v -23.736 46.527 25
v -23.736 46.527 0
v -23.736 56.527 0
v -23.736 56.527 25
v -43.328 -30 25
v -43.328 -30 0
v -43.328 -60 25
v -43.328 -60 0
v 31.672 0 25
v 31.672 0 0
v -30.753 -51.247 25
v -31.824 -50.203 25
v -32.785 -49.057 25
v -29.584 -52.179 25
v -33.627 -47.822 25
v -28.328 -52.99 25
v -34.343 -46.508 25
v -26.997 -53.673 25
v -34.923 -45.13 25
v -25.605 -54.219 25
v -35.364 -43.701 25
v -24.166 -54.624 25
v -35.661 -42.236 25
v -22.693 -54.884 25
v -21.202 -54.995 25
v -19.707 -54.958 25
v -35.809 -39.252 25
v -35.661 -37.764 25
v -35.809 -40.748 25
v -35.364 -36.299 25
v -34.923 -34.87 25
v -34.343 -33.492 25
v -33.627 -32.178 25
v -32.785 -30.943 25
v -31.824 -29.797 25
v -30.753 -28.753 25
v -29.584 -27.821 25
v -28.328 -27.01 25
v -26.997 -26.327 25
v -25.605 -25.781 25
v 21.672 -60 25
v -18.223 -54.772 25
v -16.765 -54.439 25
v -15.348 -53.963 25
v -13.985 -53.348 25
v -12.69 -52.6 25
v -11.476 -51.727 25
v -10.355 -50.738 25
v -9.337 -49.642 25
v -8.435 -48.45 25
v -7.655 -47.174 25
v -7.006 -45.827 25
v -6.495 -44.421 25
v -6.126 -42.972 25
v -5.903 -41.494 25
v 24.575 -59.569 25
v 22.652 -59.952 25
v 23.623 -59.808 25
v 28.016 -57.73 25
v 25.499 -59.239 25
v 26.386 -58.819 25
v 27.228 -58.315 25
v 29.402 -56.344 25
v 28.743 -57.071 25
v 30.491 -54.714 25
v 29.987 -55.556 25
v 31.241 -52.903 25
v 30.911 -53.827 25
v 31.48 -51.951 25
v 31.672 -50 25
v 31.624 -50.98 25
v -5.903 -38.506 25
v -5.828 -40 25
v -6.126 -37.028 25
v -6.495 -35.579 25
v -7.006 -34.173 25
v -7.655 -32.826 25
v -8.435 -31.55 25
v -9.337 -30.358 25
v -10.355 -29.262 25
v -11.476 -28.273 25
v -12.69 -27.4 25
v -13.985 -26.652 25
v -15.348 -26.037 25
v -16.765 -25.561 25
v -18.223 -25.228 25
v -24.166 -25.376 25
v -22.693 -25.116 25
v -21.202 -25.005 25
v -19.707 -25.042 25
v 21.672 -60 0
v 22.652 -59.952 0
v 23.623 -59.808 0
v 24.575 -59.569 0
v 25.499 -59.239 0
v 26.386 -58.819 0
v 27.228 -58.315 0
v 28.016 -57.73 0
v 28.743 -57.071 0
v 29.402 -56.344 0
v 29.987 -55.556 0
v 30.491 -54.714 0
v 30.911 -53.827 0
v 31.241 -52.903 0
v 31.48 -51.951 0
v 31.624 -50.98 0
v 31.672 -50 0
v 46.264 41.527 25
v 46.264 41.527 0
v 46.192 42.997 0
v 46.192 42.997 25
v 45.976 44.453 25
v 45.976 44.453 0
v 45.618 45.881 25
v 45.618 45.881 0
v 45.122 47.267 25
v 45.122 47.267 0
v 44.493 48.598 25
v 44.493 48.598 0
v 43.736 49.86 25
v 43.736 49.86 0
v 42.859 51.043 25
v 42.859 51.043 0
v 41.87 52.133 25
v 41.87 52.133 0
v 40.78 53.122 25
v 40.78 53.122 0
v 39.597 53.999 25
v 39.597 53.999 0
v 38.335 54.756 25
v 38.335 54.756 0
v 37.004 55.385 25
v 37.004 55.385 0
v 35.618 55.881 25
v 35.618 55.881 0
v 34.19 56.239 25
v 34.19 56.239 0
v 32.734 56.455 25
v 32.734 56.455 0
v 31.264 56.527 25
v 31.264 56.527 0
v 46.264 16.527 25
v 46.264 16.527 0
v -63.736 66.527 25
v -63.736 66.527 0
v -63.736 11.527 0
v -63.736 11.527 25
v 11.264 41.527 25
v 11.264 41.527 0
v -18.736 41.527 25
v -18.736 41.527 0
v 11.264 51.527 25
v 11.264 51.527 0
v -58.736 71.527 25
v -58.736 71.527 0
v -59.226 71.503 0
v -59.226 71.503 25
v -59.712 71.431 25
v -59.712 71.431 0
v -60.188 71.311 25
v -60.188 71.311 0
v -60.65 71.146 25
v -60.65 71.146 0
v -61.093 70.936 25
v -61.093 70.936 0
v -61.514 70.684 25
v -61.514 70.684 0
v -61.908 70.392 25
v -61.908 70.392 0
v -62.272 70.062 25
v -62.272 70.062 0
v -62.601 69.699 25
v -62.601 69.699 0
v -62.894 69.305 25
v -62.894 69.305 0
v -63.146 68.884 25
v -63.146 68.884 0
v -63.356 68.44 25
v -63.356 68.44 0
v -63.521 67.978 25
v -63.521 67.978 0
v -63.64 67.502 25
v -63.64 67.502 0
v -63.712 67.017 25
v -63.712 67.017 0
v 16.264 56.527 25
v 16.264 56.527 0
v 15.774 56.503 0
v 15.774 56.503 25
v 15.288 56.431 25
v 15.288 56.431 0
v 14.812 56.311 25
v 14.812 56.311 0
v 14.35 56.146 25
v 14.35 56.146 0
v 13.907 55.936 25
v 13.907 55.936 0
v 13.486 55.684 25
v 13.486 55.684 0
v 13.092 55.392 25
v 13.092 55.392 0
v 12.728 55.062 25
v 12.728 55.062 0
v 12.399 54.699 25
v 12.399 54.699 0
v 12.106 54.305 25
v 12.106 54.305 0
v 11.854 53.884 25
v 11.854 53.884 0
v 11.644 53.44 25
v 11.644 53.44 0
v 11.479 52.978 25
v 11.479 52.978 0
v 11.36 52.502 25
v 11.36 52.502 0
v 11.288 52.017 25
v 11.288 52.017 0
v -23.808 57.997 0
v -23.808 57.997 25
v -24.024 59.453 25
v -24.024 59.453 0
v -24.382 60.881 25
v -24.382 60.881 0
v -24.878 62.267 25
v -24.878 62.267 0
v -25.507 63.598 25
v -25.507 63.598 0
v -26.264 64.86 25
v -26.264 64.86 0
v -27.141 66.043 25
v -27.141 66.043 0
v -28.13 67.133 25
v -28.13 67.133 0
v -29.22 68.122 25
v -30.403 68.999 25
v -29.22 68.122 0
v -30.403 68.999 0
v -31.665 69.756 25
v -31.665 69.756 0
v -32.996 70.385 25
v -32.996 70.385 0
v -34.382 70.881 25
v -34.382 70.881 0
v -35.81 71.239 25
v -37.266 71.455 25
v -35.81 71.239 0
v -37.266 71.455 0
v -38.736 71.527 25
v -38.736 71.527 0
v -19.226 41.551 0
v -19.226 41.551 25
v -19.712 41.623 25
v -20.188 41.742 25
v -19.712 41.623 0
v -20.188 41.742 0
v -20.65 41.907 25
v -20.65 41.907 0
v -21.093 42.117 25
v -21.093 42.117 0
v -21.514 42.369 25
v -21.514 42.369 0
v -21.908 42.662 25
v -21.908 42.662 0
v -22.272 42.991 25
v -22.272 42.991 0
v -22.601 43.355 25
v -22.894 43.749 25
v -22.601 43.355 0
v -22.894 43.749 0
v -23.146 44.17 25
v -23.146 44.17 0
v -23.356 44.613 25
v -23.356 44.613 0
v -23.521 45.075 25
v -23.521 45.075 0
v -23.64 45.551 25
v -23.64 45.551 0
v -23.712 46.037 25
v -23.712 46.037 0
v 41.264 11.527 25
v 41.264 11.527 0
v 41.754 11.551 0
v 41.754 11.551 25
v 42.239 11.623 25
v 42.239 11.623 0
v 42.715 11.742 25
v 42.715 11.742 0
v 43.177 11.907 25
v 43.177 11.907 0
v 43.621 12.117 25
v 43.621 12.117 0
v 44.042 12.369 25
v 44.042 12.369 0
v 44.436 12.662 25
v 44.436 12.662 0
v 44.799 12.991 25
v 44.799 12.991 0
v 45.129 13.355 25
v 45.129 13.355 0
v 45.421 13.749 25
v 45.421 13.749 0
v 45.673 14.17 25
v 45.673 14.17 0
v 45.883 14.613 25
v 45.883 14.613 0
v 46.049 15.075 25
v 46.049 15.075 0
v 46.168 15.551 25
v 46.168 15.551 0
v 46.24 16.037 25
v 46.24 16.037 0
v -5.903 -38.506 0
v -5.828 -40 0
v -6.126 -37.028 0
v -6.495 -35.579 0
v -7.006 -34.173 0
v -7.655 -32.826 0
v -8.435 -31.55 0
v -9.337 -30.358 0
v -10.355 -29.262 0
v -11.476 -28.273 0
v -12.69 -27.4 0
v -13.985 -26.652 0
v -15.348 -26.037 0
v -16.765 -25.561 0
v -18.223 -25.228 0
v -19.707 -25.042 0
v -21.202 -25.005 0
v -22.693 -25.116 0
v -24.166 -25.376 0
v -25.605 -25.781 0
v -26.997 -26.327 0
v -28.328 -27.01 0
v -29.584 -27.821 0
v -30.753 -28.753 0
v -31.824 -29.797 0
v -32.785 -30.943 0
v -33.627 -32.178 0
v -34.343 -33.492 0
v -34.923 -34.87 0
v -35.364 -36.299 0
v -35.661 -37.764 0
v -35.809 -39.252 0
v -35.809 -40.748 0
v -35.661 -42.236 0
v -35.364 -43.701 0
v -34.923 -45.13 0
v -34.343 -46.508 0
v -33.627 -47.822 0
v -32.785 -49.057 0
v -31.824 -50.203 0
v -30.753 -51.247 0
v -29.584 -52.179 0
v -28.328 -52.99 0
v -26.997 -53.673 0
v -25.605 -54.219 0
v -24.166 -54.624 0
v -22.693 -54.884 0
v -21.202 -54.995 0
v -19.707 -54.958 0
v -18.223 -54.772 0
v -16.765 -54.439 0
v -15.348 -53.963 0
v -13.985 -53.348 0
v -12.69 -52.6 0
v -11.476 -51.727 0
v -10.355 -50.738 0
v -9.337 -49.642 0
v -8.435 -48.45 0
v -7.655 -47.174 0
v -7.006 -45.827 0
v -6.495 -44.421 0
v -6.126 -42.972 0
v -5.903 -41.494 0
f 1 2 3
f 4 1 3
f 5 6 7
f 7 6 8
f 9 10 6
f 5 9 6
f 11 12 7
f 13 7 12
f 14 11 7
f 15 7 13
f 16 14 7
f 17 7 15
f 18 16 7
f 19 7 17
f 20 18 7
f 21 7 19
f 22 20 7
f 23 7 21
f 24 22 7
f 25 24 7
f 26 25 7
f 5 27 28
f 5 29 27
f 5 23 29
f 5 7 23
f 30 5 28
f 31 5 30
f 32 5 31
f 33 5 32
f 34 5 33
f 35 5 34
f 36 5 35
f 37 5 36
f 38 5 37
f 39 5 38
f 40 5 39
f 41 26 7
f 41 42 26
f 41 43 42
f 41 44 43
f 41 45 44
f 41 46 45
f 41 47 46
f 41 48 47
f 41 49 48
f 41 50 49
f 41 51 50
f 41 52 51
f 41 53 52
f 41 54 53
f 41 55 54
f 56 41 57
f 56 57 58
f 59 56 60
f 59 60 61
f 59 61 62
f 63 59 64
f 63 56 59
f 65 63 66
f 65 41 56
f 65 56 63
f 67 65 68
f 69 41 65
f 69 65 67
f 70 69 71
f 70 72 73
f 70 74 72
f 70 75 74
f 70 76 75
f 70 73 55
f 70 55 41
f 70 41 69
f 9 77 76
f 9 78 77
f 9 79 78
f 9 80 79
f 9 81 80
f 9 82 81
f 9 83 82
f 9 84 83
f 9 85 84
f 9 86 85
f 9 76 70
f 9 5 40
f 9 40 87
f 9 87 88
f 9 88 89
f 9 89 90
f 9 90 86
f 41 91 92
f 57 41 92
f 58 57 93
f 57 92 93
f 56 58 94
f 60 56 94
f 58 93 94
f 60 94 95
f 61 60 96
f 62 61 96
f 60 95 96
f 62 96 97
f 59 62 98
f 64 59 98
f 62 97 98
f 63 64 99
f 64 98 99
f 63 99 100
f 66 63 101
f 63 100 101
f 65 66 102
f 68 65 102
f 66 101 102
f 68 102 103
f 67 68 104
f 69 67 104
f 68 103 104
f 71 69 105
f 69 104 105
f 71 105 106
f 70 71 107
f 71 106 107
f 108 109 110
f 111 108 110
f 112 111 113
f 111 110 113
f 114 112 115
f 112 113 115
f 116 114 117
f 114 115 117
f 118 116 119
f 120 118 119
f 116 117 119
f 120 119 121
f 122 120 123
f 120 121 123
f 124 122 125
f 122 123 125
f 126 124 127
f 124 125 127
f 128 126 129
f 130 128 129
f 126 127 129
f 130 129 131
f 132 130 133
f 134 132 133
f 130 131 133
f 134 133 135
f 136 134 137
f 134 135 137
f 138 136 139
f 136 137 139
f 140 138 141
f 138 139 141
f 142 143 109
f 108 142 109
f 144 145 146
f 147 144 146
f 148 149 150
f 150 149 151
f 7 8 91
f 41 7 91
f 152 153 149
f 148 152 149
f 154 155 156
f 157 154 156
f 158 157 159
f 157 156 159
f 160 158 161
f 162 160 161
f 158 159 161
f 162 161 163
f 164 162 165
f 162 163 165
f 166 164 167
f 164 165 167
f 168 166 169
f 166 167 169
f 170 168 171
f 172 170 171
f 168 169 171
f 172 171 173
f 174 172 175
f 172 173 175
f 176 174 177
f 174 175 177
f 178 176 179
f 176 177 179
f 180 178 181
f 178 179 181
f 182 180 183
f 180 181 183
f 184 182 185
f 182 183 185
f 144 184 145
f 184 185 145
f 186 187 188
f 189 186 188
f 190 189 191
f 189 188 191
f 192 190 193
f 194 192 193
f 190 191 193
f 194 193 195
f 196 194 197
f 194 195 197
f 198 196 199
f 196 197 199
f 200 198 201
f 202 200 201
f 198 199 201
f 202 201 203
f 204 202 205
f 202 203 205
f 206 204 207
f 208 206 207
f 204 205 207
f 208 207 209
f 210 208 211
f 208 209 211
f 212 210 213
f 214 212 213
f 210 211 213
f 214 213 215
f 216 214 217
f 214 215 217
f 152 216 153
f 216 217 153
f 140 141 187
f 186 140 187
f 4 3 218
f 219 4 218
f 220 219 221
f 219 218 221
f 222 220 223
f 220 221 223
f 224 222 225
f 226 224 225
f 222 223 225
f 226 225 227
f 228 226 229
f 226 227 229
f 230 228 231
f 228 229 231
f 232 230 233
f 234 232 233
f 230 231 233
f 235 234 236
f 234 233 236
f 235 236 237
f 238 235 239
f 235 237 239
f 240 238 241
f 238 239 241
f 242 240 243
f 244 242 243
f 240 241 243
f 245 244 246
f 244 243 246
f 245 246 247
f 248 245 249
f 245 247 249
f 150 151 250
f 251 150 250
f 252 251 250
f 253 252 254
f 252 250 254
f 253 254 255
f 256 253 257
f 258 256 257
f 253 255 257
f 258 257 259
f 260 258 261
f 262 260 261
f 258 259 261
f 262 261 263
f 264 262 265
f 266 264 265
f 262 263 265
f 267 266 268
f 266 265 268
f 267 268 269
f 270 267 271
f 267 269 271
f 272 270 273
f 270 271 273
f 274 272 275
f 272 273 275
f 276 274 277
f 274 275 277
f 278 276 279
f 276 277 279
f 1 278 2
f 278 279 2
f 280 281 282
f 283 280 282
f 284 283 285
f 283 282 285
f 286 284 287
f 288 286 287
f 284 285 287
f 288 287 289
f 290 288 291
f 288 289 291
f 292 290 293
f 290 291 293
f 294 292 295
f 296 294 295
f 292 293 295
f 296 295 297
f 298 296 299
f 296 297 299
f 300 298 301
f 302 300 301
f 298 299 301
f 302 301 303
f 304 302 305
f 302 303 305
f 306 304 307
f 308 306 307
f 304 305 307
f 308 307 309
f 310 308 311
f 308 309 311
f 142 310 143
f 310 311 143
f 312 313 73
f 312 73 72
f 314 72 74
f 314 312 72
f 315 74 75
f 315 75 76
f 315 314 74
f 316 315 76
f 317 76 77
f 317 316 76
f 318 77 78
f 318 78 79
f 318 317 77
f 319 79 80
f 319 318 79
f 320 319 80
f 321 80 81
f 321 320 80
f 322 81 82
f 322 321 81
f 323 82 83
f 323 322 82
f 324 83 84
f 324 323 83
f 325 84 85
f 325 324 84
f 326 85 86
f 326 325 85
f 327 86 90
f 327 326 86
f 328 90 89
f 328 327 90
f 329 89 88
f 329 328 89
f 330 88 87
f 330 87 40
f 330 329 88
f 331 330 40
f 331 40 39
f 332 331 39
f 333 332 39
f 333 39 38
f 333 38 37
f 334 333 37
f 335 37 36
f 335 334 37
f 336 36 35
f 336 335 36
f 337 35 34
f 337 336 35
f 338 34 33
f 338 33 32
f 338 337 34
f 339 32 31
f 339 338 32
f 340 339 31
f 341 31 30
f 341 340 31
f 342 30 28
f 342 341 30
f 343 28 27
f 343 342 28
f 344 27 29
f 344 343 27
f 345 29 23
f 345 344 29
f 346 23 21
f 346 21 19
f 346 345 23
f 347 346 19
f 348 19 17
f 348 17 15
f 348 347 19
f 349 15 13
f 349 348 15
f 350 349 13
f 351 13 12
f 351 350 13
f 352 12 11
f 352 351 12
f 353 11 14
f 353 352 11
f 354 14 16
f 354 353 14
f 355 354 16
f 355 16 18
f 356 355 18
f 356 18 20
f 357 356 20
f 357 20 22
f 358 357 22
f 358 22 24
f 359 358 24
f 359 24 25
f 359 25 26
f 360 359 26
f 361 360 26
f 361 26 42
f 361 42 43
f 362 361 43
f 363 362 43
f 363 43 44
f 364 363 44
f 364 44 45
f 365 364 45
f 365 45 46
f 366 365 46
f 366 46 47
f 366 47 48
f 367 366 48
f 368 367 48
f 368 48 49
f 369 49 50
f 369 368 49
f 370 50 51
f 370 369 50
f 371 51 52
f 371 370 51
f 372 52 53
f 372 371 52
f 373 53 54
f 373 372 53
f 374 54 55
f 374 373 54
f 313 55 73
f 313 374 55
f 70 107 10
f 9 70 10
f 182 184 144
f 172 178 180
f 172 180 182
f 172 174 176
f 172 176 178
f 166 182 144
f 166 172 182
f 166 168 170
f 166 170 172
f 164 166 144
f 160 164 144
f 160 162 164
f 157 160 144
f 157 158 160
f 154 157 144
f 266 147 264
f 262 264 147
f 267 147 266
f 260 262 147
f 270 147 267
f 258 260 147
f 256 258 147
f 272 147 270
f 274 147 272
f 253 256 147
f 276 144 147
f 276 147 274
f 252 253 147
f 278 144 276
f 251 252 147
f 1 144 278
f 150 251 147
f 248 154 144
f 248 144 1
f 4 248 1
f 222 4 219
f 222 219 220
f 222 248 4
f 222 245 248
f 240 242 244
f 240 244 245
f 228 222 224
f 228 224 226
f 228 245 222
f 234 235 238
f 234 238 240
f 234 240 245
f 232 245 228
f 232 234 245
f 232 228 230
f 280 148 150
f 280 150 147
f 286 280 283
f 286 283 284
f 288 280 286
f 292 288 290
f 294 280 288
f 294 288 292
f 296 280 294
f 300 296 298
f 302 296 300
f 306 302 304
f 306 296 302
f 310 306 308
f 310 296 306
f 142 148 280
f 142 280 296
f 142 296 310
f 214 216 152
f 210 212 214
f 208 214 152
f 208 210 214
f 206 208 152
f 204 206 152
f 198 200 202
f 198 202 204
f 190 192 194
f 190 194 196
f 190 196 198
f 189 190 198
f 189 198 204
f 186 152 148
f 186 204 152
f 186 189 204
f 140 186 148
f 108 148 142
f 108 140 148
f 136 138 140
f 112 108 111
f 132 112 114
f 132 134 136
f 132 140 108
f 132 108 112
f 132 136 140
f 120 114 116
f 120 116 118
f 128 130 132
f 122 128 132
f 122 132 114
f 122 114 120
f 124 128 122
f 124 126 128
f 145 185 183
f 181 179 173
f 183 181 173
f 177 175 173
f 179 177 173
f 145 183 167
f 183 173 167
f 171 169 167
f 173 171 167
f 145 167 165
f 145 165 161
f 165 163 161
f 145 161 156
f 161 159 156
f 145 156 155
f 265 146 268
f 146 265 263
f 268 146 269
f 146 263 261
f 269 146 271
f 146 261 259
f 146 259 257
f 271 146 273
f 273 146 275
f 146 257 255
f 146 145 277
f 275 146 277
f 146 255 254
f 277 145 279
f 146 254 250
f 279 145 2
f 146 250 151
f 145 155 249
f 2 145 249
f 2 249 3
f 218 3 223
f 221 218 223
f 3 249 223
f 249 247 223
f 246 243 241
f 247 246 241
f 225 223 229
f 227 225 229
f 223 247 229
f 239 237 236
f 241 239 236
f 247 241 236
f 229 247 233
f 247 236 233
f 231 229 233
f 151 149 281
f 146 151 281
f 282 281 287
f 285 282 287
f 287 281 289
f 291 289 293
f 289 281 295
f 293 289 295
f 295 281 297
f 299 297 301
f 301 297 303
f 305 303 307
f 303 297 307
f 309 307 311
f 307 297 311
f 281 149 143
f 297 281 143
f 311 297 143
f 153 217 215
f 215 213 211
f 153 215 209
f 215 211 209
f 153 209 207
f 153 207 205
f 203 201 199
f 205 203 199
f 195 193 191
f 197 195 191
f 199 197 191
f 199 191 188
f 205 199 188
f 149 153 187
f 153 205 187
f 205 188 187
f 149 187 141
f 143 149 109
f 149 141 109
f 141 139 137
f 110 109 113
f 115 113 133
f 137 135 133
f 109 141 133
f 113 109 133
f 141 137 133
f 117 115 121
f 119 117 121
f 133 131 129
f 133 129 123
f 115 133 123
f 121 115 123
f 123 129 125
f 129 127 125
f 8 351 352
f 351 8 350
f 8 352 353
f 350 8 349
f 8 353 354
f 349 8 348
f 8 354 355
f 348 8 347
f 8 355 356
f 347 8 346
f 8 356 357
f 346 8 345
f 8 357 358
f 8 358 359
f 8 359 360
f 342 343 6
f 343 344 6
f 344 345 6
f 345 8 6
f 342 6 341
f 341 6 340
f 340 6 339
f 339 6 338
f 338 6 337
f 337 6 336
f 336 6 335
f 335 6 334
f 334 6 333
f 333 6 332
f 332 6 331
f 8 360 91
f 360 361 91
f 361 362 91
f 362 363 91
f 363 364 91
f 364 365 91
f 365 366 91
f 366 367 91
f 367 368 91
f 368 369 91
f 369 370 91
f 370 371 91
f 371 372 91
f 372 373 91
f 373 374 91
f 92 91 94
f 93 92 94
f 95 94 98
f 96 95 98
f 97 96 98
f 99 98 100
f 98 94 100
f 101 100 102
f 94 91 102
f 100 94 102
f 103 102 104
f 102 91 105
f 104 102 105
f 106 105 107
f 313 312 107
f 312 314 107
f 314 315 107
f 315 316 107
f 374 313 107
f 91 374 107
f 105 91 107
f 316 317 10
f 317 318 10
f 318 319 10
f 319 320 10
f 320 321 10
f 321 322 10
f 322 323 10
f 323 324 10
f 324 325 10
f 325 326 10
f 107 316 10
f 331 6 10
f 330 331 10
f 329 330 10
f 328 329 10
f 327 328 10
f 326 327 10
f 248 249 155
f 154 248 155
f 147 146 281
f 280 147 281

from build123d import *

# Parameters (mm, degrees)
F0_R     = 15
F1_DEPTH = 25


with BuildPart() as f1:
    # F0 (on Top) → F1 (new body)
    with BuildSketch(Plane.XY):
        with BuildLine():
            Line((-43.328102, -30), (-43.328102, -60))
            Line((-43.328102, -60), (21.671898, -60))
            ThreePointArc((21.671898, -60), (28.742966, -57.071068), (31.671898, -50))
            Line((31.671898, -50), (31.671898, 0))
            Line((31.671898, 0), (-43.328102, -30))
        make_face()
        with Locations((-20.828102, -40)):
            Circle(F0_R, mode=Mode.SUBTRACT)
        with BuildLine():
            Line((-63.736163, 66.526753), (-63.736163, 11.526753))
            Line((-63.736163, 11.526753), (41.263837, 11.526753))
            ThreePointArc((41.263837, 11.526753), (44.799371, 12.991219), (46.263837, 16.526753))
            Line((46.263837, 16.526753), (46.263837, 41.526753))
            ThreePointArc((46.263837, 41.526753), (41.870439, 52.133355), (31.263837, 56.526753))
            Line((31.263837, 56.526753), (16.263837, 56.526753))
            ThreePointArc((16.263837, 56.526753), (12.728303, 55.062287), (11.263837, 51.526753))
            Line((11.263837, 51.526753), (11.263837, 41.526753))
            Line((11.263837, 41.526753), (-18.736163, 41.526753))
            ThreePointArc((-18.736163, 41.526753), (-22.271697, 42.991219), (-23.736163, 46.526753))
            Line((-23.736163, 46.526753), (-23.736163, 56.526753))
            ThreePointArc((-23.736163, 56.526753), (-28.129561, 67.133355), (-38.736163, 71.526753))
            Line((-38.736163, 71.526753), (-58.736163, 71.526753))
            ThreePointArc((-58.736163, 71.526753), (-62.271697, 70.062287), (-63.736163, 66.526753))
        make_face()
    extrude(amount=F1_DEPTH)


solid = f1.part
